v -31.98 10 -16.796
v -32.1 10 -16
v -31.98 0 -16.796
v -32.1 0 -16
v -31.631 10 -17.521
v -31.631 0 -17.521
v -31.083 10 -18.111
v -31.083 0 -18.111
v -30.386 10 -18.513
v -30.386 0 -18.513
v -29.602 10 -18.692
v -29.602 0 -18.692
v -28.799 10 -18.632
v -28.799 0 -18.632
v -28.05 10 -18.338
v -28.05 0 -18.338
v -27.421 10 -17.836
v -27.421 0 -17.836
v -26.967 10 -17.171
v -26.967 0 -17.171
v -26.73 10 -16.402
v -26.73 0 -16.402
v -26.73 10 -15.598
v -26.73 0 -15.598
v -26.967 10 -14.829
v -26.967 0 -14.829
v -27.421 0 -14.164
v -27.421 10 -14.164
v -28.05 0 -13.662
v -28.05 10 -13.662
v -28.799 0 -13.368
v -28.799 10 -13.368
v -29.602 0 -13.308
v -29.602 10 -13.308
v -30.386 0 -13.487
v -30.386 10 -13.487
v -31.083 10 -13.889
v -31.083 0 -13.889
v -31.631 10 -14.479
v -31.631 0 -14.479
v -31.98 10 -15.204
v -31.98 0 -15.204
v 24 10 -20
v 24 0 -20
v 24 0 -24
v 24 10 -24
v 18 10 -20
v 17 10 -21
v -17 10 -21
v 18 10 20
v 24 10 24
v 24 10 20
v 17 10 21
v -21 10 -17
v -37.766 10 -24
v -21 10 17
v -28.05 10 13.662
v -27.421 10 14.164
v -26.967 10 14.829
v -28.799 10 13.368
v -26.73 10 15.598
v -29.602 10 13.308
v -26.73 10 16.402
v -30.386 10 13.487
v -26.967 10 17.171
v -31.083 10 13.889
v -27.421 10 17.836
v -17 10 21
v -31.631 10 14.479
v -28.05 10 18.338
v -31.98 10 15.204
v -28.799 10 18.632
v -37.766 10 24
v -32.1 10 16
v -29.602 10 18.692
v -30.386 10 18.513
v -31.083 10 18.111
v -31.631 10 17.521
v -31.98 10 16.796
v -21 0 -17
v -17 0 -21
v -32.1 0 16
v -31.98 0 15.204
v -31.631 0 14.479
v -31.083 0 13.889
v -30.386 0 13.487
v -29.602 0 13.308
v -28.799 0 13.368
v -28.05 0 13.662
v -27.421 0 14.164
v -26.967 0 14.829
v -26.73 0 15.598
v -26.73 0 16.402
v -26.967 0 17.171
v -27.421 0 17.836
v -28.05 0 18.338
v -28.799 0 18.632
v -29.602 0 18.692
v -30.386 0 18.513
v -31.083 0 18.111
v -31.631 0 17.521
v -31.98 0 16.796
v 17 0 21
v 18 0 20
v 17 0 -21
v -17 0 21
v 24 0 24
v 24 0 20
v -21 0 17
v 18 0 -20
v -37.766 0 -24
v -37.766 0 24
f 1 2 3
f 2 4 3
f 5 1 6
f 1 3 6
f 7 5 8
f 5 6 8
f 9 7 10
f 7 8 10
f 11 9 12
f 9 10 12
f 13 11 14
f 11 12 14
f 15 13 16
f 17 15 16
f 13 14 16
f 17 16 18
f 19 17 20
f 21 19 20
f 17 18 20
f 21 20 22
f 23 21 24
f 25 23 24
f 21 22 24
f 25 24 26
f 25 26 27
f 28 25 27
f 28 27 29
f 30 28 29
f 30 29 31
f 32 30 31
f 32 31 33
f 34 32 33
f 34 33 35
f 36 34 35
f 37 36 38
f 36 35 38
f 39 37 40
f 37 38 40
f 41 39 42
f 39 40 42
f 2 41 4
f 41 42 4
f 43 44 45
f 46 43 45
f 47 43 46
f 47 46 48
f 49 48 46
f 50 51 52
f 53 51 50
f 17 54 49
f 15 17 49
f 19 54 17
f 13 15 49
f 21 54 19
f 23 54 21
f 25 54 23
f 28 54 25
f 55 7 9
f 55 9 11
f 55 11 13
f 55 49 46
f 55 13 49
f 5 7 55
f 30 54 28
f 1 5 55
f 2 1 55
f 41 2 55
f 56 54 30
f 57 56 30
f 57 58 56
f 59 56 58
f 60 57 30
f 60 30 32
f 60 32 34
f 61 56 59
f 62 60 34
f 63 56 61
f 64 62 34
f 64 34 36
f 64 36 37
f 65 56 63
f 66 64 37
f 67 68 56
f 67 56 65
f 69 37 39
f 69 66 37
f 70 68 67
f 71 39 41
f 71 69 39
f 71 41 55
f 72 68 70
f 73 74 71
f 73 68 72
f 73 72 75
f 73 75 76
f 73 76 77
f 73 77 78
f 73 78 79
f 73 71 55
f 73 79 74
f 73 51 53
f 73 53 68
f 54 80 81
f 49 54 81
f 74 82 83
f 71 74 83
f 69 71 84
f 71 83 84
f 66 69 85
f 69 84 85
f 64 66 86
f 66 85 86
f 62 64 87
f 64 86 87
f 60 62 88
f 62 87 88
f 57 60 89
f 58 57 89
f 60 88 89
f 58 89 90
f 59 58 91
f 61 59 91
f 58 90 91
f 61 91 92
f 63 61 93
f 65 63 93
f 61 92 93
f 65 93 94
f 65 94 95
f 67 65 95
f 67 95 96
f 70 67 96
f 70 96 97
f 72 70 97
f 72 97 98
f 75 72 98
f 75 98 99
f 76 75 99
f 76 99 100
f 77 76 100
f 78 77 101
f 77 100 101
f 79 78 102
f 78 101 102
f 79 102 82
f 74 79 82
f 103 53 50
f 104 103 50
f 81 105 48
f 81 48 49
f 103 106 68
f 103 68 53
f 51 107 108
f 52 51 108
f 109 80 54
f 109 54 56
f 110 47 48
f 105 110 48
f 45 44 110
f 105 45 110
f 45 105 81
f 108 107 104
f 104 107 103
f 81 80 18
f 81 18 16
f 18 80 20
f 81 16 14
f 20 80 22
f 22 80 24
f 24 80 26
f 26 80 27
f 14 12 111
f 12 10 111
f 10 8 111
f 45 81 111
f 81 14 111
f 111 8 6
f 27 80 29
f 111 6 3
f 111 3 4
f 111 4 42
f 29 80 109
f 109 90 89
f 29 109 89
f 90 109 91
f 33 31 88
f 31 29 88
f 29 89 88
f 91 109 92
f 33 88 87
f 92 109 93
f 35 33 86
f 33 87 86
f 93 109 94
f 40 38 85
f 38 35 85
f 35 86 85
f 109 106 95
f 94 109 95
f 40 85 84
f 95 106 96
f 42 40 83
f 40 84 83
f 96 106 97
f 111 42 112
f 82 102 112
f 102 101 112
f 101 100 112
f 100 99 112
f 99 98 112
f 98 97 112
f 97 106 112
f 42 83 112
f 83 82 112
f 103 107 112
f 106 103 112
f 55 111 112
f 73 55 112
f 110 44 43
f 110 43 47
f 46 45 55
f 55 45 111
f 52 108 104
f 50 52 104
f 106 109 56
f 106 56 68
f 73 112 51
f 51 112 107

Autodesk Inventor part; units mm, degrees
ref_plane "YZ Plane" through (0, 0, 0) normal (1, 0, 0) x (0, 1, 0)
ref_plane "XZ Plane" through (0, 0, 0) normal (0, 1, 0) x (-1, 0, 0)
ref_plane "XY Plane" through (0, 0, 0) normal (0, 0, 1) x (1, 0, 0)
sketch "Sketch1" plane through (0, 0, 0) normal (0, 1, 0) x (-1, 0, 0)
  circle A0 centre (15.5, 15.5) radius 1.5
  circle A1 centre (15.5, -15.5) radius 1.5
  circle A2 centre (-15.5, -15.5) radius 1.5
  circle A3 centre (-15.5, 15.5) radius 1.5
  circle A4 centre (0, 0) radius 11
  circle A5 centre (0, 0) radius 4
  line L0 (21, -17) -> (17, -21)
  line L1 (21, 17) -> (17, 21)
  line L2 (-17, -21) -> (-21, -17)
  line L3 (-21, 17) -> (-17, 21)
  circle A6 centre (0, 0) radius 2.5
  line L4 (17, -21) -> (-17, -21)
  line L5 (-21, -17) -> (-21, 17)
  line L6 (-17, 21) -> (17, 21)
  line L7 (21, 17) -> (21, -17)
  line L8 (0, -15.5) -> (-15.5, -15.5) construction
  line L9 (0, -15.5) -> (15.5, -15.5) construction
  line L10 (15.5, -15.5) -> (15.5, 15.5) construction
  line L11 (-15.5, -15.5) -> (-15.5, 15.5) construction
  line L12 (0, -21) -> (0, 0) construction
  line L13 (0, 0) -> (21, 0) construction
  point P0 (0, 0)
  dimension "d0" = 31
  dimension "d1" = 31
  dimension "d2" = 31
  dimension "d3" = 31
  dimension "d4" = 3
  dimension "d5" = 3
  dimension "d6" = 3
  dimension "d7" = 3
  dimension "d8" = 22
  dimension "d9" = 8
  dimension "d10" = 5
  dimension "d11" = 15.5
  dimension "d12" = 42
  dimension "d13" = 42
  dimension "d14" = 15.5
  dimension "d15" = 21
  dimension "d16" = 21
  dimension "d17" = 34
  dimension "d18" = 34
  dimension "d19" = 135
sketch "Sketch2" plane through (0, 0, 0) normal (0, 1, 0) x (-1, 0, 0)
  line L0 (-15.5, 15.5) -> (15.5, 15.5) construction
  line L1 (15.5, 15.5) -> (15.5, -15.5) construction
  line L2 (15.5, -15.5) -> (-15.5, -15.5) construction
  line L3 (-15.5, -15.5) -> (-15.5, 15.5) construction
  line L4 (-15.5, 15.5) -> (15.5, -15.5) construction
  line L5 (15.5, 15.5) -> (-15.5, -15.5) construction
  circle A0 centre (-15.5, -15.5) radius 1.6
  circle A1 centre (15.5, -15.5) radius 1.6
  circle A2 centre (15.5, 15.5) radius 1.6
  circle A3 centre (-15.5, 15.5) radius 1.6
  line L6 (21, -17) -> (17, -21)
  line L7 (21, -17) -> (21, 17)
  line L8 (21, 17) -> (17, 21)
  line L9 (17, 21) -> (-17, 21)
  line L10 (-17, 21) -> (-21, 17)
  line L11 (-21, 17) -> (-21, -17)
  line L12 (-21, -17) -> (-17, -21)
  line L13 (-17, -21) -> (17, -21)
  line L14 (0, -21) -> (0, -15.5) construction
  line L15 (0, 15.5) -> (0, 21) construction
  line L16 (-15.5, 0) -> (-21, 0) construction
  line L17 (15.5, 0) -> (21, 0) construction
  line L18 (-24, -24) -> (37.7656, -24)
  line L19 (37.7656, -24) -> (37.7656, 24)
  line L20 (37.7656, 24) -> (-24, 24)
  line L21 (-24, 24) -> (-24, -24)
  line L22 (-24, 20) -> (-18, 20)
  line L23 (-24, -20) -> (-18, -20)
  line L24 (-18, 20) -> (-18, 24) construction
  line L25 (-18, -20) -> (-18, -24) construction
  point P0 (0, 0)
  dimension "d20" = 31
  dimension "d22" = 3.2
  dimension "d23" = 135
  dimension "d24" = 42
  dimension "d25" = 34
  dimension "d33" = 3
  dimension "d34" = 3
  dimension "d35" = 3
  dimension "d37" = 40
sketch "Sketch3" plane through (0, 0, 0) normal (0, 1, 0) x (-1, 0, 0)
  line L0 (29.4, -16) -> (29.4, 16) construction
  circle A0 centre (29.4, -16) radius 2.7
  circle A1 centre (29.4, 16) radius 2.7
  line L1 (0, 0) -> (29.4, 0)
  dimension "d30" = 32
  dimension "d31" = 5.4
  dimension "d32" = 29.4
extrude "Extrusion1" add sketch "Sketch2" along normal blind 10 contours L7 L8 L9 L10 L22 L21 L20 L19 L18 L23 L12 L13 L6
extrude "Extrusion2" cut sketch "Sketch3" along normal through all
equation "\"d1\" = d0"
equation "\"d2\" = d0"
equation "\"d3\" = d0"
equation "\"d5\" = d4"
equation "\"d6\" = d4"
equation "\"d7\" = d4"
equation "\"d11\" = 0.5 * d0"
equation "\"d13\" = d12"
equation "\"d14\" = 0.5 * d0"
equation "\"d15\" = 0.5 * d12"
equation "\"d16\" = 0.5 * d13"
equation "\"d34\" = d33"
properties part number "Stepper Z Mount"
